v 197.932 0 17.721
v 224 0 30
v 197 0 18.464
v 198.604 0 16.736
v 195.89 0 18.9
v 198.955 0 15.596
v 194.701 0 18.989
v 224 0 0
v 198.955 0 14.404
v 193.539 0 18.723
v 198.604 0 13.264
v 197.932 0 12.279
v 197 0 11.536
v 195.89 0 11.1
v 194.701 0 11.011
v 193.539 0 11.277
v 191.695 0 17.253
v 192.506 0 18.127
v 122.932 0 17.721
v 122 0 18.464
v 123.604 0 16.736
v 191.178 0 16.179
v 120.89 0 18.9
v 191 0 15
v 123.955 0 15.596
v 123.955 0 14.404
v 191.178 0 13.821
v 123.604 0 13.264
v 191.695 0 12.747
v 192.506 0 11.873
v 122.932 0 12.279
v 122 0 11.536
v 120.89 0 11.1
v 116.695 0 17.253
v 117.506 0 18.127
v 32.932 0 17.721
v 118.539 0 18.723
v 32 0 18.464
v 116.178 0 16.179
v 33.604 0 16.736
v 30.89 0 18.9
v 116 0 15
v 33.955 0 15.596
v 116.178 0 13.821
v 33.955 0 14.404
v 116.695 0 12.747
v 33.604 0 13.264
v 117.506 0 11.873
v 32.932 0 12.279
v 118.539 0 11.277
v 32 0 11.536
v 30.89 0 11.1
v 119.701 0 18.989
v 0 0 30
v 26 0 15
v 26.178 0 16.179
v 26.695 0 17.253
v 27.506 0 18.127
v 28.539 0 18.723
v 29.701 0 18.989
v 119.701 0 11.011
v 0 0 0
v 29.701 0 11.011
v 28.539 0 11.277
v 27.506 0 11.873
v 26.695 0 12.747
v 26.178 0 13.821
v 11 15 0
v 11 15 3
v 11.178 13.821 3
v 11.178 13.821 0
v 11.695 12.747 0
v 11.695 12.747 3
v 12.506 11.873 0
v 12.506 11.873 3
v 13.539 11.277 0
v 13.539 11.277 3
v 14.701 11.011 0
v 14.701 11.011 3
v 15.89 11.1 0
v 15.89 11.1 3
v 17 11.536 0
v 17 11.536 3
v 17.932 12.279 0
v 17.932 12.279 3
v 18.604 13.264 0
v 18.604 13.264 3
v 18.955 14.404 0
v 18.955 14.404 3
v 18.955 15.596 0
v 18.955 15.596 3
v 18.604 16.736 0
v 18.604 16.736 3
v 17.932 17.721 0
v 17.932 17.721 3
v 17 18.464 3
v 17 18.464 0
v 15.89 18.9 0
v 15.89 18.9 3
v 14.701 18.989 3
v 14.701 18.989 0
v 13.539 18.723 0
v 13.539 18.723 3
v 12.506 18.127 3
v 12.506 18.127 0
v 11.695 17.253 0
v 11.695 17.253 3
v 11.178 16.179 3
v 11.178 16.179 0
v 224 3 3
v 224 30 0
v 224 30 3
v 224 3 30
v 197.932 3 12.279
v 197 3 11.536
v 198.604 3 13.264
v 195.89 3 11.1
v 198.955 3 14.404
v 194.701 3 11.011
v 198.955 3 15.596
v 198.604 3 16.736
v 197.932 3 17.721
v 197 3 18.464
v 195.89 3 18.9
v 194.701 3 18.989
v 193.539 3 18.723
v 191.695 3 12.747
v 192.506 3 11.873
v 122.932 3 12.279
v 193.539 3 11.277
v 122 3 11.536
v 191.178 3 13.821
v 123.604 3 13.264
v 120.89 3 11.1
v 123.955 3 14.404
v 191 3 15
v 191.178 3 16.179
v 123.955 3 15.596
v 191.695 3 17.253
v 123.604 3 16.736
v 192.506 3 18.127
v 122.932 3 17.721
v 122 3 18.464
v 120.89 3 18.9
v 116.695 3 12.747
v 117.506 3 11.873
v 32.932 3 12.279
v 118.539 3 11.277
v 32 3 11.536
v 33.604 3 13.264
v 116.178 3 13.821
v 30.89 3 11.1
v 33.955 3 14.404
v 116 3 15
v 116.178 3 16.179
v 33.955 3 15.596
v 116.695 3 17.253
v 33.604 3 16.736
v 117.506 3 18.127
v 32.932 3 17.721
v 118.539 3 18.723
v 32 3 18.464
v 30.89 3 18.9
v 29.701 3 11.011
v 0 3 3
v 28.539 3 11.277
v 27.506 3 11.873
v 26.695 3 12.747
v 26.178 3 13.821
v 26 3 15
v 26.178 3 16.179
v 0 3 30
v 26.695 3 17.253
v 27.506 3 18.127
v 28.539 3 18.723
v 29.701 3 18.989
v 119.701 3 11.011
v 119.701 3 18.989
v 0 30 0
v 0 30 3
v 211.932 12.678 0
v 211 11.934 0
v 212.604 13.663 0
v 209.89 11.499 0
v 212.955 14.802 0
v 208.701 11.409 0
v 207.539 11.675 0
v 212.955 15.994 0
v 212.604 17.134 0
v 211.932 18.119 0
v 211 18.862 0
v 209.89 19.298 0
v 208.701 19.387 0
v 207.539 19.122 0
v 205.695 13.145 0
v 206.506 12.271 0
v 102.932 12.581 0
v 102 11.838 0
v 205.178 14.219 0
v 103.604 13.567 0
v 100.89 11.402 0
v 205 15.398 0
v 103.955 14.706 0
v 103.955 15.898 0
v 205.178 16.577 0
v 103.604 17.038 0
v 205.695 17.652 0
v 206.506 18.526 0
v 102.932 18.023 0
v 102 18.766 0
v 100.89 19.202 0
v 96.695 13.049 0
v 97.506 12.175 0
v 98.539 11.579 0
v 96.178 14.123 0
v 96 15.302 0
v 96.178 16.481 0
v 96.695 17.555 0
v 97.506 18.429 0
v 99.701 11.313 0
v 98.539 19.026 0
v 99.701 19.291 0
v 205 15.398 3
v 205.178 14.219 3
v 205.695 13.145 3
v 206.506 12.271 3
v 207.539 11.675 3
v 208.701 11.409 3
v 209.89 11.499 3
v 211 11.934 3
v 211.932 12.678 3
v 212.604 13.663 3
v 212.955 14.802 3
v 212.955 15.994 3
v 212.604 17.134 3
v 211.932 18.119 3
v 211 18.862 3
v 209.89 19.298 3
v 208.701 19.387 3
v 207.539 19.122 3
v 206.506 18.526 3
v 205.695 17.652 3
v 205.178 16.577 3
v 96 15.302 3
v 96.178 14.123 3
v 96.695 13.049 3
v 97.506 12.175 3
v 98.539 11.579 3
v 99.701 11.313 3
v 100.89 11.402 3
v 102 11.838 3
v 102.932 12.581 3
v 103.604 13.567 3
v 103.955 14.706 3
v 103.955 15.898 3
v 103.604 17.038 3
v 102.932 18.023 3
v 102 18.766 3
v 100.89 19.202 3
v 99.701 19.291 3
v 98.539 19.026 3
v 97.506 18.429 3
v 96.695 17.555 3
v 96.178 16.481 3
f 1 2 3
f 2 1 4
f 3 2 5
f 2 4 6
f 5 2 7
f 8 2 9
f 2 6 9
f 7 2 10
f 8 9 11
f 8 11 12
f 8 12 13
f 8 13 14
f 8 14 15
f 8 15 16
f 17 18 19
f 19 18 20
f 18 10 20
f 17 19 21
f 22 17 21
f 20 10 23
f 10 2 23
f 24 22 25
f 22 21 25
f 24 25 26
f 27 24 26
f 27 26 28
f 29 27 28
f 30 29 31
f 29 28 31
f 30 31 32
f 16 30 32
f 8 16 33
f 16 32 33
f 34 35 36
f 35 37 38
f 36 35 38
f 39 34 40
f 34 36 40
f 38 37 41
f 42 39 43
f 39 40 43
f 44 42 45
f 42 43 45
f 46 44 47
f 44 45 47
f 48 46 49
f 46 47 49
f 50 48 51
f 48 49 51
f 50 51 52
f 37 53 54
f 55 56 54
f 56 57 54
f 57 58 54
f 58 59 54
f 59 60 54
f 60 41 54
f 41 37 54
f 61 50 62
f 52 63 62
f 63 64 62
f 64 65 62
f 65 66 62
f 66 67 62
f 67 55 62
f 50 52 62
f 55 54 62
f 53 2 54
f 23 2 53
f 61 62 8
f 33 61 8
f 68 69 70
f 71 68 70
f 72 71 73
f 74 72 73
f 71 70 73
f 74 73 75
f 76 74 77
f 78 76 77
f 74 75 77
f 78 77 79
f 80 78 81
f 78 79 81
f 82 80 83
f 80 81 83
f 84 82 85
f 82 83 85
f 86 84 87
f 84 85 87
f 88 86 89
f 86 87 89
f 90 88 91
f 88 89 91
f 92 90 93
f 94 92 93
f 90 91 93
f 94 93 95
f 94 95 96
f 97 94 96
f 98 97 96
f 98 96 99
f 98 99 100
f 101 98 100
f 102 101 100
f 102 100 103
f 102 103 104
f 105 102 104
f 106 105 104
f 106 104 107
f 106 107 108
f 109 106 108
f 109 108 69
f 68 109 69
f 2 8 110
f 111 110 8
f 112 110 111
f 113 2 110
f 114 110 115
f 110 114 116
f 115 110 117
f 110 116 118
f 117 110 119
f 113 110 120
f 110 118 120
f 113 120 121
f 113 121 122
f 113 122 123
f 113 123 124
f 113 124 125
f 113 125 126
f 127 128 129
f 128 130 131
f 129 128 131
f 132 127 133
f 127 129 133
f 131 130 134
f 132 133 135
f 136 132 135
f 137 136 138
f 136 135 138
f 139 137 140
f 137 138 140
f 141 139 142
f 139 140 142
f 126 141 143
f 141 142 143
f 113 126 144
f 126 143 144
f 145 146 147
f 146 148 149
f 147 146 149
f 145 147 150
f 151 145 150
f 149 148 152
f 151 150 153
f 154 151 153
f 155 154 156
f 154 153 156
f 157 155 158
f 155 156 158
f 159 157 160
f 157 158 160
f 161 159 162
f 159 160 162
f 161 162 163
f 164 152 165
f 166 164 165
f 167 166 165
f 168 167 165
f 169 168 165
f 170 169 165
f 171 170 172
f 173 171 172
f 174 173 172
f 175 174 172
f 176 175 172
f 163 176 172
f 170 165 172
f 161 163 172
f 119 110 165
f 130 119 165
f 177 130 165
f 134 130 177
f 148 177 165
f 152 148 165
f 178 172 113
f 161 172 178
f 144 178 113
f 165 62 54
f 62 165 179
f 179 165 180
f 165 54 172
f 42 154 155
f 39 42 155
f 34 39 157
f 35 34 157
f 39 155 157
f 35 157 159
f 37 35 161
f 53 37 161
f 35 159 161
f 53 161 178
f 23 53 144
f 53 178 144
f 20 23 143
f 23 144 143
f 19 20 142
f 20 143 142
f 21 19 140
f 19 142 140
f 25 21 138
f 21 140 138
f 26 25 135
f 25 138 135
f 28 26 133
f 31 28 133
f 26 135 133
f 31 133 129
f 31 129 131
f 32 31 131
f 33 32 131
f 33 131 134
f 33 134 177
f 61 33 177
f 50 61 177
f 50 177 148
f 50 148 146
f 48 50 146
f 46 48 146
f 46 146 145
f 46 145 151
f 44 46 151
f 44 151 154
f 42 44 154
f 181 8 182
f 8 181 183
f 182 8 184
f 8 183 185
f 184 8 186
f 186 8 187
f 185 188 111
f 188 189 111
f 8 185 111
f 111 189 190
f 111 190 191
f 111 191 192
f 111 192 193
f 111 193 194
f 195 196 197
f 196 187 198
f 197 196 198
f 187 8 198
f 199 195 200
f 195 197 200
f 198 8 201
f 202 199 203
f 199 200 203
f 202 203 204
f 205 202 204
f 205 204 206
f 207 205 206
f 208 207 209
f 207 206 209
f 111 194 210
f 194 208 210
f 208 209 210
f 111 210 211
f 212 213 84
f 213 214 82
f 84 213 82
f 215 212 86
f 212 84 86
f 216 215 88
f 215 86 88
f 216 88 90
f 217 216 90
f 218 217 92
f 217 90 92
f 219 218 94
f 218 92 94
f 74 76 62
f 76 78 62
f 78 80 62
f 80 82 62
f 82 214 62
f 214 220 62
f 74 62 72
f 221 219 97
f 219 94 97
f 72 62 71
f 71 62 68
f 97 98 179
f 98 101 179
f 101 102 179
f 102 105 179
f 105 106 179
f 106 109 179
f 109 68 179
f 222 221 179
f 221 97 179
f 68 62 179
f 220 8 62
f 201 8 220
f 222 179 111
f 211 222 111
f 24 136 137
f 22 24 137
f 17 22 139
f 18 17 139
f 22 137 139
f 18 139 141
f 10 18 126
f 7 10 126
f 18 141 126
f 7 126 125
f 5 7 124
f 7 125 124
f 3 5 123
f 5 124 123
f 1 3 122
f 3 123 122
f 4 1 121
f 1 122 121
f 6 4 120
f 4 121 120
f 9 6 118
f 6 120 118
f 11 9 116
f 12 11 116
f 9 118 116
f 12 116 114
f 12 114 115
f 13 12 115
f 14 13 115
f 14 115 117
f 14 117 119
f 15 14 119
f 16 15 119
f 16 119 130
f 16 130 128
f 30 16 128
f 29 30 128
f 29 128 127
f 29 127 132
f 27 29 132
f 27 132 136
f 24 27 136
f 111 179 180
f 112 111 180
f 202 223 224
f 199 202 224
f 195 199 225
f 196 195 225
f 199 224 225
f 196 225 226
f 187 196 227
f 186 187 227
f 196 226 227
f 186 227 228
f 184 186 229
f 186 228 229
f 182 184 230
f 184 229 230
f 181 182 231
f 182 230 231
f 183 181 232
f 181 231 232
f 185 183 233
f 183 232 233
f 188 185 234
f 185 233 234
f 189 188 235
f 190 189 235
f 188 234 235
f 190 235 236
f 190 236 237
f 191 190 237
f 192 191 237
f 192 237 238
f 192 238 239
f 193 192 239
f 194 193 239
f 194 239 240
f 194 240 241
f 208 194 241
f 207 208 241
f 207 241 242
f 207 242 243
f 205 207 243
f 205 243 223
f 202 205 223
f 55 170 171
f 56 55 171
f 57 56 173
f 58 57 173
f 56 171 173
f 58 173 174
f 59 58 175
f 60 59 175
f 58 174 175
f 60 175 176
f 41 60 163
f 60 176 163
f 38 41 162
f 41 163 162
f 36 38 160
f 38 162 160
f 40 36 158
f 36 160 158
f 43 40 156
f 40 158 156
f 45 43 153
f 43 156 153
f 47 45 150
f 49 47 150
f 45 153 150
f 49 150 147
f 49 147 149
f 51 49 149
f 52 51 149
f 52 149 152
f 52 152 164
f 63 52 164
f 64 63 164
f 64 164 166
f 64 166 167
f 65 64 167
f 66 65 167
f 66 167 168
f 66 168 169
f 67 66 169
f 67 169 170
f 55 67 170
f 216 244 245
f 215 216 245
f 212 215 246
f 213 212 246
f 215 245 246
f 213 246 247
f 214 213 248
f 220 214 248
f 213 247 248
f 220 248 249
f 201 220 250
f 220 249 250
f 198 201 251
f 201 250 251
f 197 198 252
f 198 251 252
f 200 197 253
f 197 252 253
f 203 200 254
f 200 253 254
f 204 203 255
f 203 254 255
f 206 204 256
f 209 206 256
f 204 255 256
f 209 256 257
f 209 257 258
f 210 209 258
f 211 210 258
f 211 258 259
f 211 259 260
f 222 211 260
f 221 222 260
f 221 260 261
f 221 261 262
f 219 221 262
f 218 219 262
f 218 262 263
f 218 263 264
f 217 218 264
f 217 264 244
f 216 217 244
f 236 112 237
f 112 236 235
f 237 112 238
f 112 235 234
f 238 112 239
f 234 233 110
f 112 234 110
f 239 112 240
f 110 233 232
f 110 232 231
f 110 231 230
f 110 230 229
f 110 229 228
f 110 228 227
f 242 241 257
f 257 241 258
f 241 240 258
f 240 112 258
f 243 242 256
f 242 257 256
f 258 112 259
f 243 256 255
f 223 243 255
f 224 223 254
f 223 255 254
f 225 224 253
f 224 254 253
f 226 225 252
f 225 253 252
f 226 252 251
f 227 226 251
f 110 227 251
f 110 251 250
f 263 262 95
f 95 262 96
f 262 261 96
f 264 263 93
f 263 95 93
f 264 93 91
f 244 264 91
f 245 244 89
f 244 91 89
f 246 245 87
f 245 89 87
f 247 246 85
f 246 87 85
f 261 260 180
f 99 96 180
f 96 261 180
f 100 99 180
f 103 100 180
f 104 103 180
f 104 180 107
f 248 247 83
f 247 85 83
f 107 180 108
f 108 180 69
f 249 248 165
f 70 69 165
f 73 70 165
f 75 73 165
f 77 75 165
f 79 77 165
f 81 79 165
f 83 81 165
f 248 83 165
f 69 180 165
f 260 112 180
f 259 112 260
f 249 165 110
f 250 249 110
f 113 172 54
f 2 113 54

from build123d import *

# Parameters (mm, degrees)
F1_DEPTH = 224
F3_D     = 8
F5_D     = 8


with BuildPart() as f1:
    # F0 (on Right) → F1 (new body)
    with BuildSketch(Plane.YZ):
        Polygon((0, 30), (0, 0), (30, 0), (30, 3), (3, 3), (3, 30), align=None)
    extrude(amount=F1_DEPTH)

    # F3 (through all)
    with Locations(Plane(origin=(0, 0, 0), x_dir=(1, 0, 0), z_dir=(0, 0, -1))):
        with Locations((15, -15), (100, -15.3021634132), (209, -15.3983095661)):
            Hole(F3_D / 2)

    # F5 (through all)
    with Locations(Plane.XZ):
        with Locations((30, 15), (120, 15), (195, 15)):
            Hole(F5_D / 2)


solid = f1.part
